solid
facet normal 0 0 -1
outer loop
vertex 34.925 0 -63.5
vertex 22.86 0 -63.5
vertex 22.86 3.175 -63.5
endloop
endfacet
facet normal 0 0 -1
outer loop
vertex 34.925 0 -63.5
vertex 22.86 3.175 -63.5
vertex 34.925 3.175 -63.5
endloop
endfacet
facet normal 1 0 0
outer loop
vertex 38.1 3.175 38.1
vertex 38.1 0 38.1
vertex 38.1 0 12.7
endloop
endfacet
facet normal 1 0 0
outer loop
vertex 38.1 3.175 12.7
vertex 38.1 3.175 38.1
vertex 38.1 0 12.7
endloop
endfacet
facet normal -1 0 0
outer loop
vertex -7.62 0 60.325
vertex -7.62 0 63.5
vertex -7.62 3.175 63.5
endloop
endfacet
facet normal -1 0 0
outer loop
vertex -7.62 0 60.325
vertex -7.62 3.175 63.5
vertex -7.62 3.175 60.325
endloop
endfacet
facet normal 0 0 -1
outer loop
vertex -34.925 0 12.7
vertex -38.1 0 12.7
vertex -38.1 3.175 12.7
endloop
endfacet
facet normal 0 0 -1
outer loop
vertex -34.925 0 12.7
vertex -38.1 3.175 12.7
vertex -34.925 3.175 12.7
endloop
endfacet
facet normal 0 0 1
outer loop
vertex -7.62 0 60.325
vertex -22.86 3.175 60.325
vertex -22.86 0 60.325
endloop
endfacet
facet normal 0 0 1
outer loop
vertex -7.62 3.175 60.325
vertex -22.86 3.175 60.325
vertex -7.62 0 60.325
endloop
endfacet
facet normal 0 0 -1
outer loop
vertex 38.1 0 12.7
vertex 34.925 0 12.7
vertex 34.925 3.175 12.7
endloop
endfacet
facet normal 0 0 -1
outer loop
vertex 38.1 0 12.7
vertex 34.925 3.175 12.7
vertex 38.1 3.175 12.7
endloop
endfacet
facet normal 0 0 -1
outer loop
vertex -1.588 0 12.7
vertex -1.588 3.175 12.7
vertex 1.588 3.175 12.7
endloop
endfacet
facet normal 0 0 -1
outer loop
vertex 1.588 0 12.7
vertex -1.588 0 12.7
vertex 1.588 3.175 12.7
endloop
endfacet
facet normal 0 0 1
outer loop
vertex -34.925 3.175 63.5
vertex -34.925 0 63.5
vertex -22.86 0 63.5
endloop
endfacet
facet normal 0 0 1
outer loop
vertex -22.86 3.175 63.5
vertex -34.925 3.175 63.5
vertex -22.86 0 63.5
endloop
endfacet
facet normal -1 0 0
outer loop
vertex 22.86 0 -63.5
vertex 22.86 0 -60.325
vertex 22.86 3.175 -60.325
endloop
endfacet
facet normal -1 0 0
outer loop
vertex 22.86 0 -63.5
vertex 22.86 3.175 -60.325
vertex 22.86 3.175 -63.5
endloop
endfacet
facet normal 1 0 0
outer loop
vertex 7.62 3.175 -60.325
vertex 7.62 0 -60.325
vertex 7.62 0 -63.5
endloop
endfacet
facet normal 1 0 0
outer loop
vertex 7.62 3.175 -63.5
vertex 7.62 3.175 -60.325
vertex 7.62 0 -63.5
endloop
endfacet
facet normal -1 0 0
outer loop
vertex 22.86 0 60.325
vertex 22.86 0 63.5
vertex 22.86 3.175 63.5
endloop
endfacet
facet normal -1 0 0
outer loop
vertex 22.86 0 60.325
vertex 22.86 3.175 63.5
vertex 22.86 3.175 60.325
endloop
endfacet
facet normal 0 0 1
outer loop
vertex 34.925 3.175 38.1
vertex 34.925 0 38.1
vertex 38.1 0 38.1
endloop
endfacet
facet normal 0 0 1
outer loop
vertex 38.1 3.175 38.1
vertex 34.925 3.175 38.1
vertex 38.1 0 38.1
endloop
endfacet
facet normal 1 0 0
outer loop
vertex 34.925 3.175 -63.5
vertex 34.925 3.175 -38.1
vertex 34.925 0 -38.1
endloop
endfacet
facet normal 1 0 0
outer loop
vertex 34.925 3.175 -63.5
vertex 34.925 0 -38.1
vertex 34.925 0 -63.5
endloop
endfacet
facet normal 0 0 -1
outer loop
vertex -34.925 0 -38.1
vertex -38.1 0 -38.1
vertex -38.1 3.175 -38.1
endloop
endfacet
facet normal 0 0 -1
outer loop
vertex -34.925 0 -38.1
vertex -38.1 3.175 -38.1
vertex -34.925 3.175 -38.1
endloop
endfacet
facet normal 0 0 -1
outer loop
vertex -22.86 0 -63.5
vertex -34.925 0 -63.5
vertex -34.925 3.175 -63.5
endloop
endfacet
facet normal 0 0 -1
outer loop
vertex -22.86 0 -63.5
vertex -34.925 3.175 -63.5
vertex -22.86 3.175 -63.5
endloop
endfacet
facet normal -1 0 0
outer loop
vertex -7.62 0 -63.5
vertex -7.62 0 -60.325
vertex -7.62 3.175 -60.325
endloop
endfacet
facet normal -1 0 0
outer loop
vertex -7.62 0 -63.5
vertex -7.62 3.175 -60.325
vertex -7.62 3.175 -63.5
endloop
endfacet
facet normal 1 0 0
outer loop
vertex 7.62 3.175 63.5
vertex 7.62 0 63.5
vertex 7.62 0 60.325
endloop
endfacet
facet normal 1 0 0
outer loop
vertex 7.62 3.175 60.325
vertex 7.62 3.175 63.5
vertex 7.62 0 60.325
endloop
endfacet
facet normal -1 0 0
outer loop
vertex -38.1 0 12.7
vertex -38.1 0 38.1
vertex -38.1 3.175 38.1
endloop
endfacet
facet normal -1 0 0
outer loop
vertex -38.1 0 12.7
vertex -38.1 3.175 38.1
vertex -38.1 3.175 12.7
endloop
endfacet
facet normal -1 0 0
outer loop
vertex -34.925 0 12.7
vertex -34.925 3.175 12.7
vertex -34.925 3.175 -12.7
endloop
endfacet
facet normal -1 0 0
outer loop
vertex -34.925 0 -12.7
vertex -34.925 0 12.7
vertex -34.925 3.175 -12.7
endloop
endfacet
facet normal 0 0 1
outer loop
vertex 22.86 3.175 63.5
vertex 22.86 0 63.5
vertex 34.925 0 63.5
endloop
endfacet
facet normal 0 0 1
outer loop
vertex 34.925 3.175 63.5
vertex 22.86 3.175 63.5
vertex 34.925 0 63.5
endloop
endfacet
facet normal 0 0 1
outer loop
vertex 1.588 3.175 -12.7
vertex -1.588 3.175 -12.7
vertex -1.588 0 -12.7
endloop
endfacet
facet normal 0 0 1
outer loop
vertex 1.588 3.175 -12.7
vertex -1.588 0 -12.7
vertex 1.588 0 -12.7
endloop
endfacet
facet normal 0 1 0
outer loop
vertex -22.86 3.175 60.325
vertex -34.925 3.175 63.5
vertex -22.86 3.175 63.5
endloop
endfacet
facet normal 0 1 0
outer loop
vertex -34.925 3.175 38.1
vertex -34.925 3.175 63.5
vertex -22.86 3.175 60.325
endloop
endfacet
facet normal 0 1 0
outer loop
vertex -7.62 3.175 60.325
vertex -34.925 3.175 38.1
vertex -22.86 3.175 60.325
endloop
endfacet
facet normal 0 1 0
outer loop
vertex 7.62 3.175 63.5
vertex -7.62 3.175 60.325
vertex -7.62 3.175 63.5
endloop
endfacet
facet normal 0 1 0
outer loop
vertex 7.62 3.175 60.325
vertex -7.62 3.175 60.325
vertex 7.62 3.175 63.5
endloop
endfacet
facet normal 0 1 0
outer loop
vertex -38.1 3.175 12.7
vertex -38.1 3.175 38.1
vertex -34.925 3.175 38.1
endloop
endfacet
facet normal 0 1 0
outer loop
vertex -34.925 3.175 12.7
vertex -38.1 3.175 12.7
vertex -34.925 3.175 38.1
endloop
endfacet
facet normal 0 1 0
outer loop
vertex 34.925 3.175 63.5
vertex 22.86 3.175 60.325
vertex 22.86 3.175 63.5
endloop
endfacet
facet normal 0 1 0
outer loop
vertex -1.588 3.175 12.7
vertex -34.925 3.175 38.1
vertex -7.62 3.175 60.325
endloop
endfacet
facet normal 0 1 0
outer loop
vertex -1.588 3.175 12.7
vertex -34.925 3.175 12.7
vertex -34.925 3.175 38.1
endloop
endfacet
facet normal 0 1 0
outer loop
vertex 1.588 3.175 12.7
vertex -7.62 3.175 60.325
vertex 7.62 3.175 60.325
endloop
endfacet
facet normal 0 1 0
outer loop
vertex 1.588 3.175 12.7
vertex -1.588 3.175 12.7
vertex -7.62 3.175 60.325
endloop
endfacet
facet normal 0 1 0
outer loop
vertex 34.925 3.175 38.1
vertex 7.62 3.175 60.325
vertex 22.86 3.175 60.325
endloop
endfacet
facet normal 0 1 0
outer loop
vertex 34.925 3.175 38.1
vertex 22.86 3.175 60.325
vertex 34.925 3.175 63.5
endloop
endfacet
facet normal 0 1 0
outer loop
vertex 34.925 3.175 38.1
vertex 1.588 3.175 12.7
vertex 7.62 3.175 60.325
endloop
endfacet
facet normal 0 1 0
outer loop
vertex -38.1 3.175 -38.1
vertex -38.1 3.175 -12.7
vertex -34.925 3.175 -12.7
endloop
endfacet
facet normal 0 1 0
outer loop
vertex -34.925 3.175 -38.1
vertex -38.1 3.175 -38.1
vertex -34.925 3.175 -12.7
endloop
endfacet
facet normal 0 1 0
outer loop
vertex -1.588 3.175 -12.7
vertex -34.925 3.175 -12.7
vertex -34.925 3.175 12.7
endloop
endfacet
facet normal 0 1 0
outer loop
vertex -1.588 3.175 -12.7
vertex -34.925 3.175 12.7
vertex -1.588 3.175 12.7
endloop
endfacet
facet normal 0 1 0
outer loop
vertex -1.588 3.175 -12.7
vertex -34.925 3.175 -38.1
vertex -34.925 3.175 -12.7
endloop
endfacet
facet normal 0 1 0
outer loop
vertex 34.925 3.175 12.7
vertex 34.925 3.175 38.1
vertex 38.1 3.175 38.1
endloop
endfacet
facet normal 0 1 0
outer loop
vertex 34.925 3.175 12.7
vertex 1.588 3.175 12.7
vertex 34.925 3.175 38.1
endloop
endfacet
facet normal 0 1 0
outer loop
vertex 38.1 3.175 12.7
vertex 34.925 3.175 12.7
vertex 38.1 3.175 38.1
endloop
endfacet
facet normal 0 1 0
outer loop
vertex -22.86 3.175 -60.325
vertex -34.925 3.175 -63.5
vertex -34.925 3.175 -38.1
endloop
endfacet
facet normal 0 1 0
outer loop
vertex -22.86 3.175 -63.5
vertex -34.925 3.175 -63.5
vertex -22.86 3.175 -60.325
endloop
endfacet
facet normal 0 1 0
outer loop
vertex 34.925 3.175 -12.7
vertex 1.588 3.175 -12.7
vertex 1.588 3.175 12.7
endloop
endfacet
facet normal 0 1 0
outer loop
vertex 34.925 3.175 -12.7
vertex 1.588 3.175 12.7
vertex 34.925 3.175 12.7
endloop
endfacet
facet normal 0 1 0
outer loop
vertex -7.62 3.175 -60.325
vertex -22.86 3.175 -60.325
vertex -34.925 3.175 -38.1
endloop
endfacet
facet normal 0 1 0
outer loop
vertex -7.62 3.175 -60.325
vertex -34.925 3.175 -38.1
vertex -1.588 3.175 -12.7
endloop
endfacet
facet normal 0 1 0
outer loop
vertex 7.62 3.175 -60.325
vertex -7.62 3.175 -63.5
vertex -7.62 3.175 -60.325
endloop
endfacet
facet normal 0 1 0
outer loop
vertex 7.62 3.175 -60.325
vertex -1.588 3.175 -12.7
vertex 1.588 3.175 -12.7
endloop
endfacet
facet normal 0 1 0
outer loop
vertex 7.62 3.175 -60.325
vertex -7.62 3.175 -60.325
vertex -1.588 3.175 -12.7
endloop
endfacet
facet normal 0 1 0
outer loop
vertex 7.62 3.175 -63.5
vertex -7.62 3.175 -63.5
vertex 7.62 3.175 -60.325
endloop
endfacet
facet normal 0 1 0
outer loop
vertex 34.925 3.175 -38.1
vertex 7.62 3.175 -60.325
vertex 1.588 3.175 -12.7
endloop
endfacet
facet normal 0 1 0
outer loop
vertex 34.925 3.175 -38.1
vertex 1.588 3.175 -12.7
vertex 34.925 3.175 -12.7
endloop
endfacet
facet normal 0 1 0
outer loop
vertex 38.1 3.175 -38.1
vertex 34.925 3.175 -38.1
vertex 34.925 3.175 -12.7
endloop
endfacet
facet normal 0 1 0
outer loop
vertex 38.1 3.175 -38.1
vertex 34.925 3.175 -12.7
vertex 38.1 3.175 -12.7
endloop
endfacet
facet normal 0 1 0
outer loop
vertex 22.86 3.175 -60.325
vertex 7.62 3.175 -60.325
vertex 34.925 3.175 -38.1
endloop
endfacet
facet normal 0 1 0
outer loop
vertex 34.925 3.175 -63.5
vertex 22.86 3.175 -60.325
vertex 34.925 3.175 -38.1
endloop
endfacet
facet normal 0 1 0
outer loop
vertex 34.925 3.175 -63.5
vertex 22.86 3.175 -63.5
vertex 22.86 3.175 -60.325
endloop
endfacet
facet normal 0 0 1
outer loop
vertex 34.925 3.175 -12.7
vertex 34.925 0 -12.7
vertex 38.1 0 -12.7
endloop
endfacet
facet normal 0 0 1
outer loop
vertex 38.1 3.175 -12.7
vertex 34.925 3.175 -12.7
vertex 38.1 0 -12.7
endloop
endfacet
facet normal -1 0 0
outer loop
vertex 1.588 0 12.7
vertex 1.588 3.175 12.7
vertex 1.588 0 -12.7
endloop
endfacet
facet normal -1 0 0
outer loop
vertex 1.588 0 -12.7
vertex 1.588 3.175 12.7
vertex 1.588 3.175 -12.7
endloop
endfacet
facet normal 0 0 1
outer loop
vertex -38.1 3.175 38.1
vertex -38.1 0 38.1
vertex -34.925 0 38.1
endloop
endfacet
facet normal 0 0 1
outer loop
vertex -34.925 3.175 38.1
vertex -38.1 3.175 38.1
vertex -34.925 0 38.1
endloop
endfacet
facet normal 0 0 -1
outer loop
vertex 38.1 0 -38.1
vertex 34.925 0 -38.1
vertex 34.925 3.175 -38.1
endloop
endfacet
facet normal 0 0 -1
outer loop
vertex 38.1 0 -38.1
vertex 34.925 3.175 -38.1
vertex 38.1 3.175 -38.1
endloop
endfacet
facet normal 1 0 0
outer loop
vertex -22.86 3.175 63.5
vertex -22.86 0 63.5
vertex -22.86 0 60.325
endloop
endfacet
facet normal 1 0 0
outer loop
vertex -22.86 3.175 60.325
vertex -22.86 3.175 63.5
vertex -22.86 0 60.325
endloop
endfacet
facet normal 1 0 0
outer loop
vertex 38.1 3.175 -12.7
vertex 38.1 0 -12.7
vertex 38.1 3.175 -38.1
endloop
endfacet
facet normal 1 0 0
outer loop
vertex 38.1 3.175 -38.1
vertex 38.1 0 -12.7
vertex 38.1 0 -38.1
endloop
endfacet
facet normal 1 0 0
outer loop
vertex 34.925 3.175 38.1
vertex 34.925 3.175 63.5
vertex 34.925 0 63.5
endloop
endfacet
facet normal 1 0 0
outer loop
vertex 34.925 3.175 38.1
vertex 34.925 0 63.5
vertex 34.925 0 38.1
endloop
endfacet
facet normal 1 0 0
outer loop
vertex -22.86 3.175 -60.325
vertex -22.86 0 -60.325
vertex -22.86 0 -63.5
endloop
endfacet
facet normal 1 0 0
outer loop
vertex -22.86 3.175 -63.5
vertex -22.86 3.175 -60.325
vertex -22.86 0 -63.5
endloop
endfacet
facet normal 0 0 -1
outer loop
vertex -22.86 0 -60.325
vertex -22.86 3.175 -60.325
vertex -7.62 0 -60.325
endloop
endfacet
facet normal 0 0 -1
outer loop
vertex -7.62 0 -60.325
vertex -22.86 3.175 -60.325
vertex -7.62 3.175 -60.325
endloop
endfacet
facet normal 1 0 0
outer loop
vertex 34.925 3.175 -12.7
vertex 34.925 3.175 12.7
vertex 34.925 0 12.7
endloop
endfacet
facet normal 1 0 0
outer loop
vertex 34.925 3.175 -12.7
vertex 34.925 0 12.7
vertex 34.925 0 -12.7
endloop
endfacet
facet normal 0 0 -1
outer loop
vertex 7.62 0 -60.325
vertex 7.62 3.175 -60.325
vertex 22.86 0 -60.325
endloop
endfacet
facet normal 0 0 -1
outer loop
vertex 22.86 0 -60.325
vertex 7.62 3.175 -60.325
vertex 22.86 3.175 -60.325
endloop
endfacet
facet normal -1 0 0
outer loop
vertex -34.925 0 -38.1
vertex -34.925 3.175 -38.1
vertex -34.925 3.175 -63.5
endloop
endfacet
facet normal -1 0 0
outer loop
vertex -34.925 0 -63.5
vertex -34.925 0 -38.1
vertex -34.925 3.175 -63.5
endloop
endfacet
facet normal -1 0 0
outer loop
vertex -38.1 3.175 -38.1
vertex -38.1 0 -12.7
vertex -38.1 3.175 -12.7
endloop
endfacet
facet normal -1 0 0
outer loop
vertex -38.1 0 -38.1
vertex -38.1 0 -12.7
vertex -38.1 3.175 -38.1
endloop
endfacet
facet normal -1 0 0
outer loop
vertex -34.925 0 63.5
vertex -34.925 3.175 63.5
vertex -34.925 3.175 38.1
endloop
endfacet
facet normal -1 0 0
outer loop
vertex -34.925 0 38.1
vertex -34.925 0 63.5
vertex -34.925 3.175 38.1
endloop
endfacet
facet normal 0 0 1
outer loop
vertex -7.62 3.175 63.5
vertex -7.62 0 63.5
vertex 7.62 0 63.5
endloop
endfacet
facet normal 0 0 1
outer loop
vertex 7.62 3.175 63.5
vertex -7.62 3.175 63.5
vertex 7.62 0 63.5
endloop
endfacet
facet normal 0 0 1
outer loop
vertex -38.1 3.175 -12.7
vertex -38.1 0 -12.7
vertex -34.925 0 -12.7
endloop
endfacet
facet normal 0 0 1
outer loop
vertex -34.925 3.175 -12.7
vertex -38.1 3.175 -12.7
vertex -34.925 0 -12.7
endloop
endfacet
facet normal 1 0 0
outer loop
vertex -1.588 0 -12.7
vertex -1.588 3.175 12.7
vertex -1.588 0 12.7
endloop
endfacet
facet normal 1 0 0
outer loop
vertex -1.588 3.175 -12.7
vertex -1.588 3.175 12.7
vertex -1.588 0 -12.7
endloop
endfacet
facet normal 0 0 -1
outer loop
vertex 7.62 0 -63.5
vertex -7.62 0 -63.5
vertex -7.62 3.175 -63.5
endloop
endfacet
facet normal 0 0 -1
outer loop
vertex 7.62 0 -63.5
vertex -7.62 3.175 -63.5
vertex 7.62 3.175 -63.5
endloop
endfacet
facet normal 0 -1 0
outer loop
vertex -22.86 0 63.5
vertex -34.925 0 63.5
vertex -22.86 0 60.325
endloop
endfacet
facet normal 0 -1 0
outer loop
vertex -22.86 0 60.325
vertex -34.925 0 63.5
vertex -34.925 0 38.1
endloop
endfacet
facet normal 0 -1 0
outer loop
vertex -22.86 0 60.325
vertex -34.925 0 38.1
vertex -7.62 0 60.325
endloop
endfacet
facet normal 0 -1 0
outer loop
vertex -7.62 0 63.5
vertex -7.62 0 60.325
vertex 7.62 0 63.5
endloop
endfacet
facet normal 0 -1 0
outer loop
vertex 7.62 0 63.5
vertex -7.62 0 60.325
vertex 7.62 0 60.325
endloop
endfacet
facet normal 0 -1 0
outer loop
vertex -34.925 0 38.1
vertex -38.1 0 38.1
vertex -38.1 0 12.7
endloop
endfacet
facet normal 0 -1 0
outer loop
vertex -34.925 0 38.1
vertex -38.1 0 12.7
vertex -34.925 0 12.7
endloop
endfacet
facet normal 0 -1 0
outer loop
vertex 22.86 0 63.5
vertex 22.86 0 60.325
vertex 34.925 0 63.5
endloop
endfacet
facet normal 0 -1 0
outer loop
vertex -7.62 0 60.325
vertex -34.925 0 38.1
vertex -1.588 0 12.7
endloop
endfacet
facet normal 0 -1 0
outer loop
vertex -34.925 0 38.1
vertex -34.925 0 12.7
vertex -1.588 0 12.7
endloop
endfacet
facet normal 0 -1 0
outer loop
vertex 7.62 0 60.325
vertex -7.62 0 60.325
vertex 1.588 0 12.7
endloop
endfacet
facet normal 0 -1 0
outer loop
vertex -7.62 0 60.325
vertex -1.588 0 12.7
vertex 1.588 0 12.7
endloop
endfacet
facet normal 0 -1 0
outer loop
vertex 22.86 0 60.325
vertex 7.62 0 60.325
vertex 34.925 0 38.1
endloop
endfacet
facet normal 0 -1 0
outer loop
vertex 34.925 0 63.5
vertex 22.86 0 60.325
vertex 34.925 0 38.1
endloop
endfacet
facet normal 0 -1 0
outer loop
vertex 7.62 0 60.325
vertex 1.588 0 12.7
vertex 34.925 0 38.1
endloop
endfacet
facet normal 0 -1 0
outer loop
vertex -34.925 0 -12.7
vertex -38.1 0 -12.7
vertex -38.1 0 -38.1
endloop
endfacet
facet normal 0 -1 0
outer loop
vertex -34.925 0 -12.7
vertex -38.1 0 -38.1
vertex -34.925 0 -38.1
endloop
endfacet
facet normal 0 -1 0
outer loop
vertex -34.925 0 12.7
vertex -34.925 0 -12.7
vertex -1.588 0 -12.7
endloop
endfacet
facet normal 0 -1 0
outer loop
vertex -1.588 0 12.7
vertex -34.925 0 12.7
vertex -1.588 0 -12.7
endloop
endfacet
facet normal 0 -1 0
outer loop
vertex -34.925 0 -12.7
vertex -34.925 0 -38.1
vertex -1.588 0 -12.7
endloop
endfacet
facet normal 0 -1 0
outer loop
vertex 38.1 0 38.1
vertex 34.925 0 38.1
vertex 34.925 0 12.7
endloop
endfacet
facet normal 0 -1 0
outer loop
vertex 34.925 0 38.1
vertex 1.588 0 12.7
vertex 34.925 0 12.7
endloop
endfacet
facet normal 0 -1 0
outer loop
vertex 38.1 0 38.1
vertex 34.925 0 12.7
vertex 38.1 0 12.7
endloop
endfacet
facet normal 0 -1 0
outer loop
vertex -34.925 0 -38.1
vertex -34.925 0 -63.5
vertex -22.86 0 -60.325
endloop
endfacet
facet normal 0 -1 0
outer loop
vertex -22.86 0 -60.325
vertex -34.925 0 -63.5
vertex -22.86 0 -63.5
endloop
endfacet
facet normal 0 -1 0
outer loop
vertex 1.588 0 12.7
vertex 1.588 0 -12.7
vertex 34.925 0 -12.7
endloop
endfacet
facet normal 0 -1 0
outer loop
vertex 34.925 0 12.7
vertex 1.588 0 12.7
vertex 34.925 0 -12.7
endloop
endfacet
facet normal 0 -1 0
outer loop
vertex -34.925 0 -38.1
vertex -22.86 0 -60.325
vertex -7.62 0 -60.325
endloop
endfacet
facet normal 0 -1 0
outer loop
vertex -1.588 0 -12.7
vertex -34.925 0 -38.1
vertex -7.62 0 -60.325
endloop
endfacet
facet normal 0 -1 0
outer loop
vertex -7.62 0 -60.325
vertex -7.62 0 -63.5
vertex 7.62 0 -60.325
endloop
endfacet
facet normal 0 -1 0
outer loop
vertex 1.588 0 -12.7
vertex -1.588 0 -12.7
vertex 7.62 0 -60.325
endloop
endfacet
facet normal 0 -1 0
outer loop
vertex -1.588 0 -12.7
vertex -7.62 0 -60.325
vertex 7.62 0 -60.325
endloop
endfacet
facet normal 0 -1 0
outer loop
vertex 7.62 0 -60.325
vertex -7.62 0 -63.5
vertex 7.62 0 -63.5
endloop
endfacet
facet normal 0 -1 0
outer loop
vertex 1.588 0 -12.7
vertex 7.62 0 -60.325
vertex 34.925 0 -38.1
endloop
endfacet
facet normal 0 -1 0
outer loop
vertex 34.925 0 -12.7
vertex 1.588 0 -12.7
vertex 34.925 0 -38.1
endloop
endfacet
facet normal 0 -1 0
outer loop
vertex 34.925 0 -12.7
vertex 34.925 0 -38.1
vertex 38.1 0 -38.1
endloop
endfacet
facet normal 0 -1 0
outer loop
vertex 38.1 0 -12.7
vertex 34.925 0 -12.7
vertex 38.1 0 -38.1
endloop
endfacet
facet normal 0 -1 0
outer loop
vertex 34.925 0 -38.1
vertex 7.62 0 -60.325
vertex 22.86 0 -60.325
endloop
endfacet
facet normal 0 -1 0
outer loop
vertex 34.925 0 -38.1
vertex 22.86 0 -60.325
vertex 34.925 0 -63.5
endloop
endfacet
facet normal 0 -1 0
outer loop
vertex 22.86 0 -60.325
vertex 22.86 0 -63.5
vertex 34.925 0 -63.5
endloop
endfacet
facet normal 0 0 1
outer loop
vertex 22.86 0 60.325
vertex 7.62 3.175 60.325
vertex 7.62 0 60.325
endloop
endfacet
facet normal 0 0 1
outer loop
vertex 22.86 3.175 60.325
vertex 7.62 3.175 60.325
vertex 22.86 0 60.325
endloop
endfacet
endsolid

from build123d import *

# Parameters (mm, degrees)
SKETCH1_W           = 76.2
SKETCH1_H           = 127
BOSS_EXTRUDE1_DEPTH = 3.175
SKETCH2_W           = 3.175
SKETCH2_H           = 25.4
CUT_EXTRUDE1_DEPTH  = 3.175
LPATTERN1_COUNT     = 3
LPATTERN1_PITCH     = 50.8
SKETCH3_W           = 15.24
SKETCH3_H           = 3.175
CUT_EXTRUDE2_DEPTH  = 3.175
LPATTERN2_COUNT     = 3
LPATTERN2_PITCH     = 30.48
SKETCH4_W           = 3.175
SKETCH4_H           = 25.4
CUT_EXTRUDE3_DEPTH  = 3.175


with BuildPart() as part:
    # Sketch1 → Boss-Extrude1 (new body)
    with BuildSketch(Plane(origin=(0, 0, 0), x_dir=(1, 0, 0), z_dir=(0, 1, 0))):
        Rectangle(SKETCH1_W, SKETCH1_H)
    extrude(amount=BOSS_EXTRUDE1_DEPTH)

    # Sketch2 → Cut-Extrude1 (cut)
    with BuildSketch(Plane(origin=(0, 3.175, 0), x_dir=(1, 0, 0), z_dir=(0, 1, 0))):
        with Locations((-36.5125, 50.8)):
            Rectangle(SKETCH2_W, SKETCH2_H)
        with Locations((36.5125, 50.8)):
            Rectangle(SKETCH2_W, SKETCH2_H)
    cut_extrude1 = extrude(amount=-CUT_EXTRUDE1_DEPTH, mode=Mode.SUBTRACT)

    # LPattern1: Cut-Extrude1 ×3
    with Locations(*[(0, 0, i * LPATTERN1_PITCH) for i in range(1, LPATTERN1_COUNT)]):
        add(cut_extrude1, mode=Mode.SUBTRACT)

    # Sketch3 → Cut-Extrude2 (cut)
    with BuildSketch(Plane(origin=(0, 3.175, 0), x_dir=(1, 0, 0), z_dir=(0, 1, 0))):
        with Locations((15.24, 61.9125)):
            Rectangle(SKETCH3_W, SKETCH3_H)
        with Locations((15.24, -61.9125)):
            Rectangle(SKETCH3_W, SKETCH3_H)
    cut_extrude2 = extrude(amount=-CUT_EXTRUDE2_DEPTH, mode=Mode.SUBTRACT)

    # LPattern2: Cut-Extrude2 ×3
    with Locations(*[(-i * LPATTERN2_PITCH, 0, 0) for i in range(1, LPATTERN2_COUNT)]):
        add(cut_extrude2, mode=Mode.SUBTRACT)

    # Sketch4 → Cut-Extrude3 (cut)
    with BuildSketch(Plane(origin=(0, 3.175, 0), x_dir=(1, 0, 0), z_dir=(0, 1, 0))):
        Rectangle(SKETCH4_W, SKETCH4_H)
    extrude(amount=-CUT_EXTRUDE3_DEPTH, mode=Mode.SUBTRACT)


solid = part.part
